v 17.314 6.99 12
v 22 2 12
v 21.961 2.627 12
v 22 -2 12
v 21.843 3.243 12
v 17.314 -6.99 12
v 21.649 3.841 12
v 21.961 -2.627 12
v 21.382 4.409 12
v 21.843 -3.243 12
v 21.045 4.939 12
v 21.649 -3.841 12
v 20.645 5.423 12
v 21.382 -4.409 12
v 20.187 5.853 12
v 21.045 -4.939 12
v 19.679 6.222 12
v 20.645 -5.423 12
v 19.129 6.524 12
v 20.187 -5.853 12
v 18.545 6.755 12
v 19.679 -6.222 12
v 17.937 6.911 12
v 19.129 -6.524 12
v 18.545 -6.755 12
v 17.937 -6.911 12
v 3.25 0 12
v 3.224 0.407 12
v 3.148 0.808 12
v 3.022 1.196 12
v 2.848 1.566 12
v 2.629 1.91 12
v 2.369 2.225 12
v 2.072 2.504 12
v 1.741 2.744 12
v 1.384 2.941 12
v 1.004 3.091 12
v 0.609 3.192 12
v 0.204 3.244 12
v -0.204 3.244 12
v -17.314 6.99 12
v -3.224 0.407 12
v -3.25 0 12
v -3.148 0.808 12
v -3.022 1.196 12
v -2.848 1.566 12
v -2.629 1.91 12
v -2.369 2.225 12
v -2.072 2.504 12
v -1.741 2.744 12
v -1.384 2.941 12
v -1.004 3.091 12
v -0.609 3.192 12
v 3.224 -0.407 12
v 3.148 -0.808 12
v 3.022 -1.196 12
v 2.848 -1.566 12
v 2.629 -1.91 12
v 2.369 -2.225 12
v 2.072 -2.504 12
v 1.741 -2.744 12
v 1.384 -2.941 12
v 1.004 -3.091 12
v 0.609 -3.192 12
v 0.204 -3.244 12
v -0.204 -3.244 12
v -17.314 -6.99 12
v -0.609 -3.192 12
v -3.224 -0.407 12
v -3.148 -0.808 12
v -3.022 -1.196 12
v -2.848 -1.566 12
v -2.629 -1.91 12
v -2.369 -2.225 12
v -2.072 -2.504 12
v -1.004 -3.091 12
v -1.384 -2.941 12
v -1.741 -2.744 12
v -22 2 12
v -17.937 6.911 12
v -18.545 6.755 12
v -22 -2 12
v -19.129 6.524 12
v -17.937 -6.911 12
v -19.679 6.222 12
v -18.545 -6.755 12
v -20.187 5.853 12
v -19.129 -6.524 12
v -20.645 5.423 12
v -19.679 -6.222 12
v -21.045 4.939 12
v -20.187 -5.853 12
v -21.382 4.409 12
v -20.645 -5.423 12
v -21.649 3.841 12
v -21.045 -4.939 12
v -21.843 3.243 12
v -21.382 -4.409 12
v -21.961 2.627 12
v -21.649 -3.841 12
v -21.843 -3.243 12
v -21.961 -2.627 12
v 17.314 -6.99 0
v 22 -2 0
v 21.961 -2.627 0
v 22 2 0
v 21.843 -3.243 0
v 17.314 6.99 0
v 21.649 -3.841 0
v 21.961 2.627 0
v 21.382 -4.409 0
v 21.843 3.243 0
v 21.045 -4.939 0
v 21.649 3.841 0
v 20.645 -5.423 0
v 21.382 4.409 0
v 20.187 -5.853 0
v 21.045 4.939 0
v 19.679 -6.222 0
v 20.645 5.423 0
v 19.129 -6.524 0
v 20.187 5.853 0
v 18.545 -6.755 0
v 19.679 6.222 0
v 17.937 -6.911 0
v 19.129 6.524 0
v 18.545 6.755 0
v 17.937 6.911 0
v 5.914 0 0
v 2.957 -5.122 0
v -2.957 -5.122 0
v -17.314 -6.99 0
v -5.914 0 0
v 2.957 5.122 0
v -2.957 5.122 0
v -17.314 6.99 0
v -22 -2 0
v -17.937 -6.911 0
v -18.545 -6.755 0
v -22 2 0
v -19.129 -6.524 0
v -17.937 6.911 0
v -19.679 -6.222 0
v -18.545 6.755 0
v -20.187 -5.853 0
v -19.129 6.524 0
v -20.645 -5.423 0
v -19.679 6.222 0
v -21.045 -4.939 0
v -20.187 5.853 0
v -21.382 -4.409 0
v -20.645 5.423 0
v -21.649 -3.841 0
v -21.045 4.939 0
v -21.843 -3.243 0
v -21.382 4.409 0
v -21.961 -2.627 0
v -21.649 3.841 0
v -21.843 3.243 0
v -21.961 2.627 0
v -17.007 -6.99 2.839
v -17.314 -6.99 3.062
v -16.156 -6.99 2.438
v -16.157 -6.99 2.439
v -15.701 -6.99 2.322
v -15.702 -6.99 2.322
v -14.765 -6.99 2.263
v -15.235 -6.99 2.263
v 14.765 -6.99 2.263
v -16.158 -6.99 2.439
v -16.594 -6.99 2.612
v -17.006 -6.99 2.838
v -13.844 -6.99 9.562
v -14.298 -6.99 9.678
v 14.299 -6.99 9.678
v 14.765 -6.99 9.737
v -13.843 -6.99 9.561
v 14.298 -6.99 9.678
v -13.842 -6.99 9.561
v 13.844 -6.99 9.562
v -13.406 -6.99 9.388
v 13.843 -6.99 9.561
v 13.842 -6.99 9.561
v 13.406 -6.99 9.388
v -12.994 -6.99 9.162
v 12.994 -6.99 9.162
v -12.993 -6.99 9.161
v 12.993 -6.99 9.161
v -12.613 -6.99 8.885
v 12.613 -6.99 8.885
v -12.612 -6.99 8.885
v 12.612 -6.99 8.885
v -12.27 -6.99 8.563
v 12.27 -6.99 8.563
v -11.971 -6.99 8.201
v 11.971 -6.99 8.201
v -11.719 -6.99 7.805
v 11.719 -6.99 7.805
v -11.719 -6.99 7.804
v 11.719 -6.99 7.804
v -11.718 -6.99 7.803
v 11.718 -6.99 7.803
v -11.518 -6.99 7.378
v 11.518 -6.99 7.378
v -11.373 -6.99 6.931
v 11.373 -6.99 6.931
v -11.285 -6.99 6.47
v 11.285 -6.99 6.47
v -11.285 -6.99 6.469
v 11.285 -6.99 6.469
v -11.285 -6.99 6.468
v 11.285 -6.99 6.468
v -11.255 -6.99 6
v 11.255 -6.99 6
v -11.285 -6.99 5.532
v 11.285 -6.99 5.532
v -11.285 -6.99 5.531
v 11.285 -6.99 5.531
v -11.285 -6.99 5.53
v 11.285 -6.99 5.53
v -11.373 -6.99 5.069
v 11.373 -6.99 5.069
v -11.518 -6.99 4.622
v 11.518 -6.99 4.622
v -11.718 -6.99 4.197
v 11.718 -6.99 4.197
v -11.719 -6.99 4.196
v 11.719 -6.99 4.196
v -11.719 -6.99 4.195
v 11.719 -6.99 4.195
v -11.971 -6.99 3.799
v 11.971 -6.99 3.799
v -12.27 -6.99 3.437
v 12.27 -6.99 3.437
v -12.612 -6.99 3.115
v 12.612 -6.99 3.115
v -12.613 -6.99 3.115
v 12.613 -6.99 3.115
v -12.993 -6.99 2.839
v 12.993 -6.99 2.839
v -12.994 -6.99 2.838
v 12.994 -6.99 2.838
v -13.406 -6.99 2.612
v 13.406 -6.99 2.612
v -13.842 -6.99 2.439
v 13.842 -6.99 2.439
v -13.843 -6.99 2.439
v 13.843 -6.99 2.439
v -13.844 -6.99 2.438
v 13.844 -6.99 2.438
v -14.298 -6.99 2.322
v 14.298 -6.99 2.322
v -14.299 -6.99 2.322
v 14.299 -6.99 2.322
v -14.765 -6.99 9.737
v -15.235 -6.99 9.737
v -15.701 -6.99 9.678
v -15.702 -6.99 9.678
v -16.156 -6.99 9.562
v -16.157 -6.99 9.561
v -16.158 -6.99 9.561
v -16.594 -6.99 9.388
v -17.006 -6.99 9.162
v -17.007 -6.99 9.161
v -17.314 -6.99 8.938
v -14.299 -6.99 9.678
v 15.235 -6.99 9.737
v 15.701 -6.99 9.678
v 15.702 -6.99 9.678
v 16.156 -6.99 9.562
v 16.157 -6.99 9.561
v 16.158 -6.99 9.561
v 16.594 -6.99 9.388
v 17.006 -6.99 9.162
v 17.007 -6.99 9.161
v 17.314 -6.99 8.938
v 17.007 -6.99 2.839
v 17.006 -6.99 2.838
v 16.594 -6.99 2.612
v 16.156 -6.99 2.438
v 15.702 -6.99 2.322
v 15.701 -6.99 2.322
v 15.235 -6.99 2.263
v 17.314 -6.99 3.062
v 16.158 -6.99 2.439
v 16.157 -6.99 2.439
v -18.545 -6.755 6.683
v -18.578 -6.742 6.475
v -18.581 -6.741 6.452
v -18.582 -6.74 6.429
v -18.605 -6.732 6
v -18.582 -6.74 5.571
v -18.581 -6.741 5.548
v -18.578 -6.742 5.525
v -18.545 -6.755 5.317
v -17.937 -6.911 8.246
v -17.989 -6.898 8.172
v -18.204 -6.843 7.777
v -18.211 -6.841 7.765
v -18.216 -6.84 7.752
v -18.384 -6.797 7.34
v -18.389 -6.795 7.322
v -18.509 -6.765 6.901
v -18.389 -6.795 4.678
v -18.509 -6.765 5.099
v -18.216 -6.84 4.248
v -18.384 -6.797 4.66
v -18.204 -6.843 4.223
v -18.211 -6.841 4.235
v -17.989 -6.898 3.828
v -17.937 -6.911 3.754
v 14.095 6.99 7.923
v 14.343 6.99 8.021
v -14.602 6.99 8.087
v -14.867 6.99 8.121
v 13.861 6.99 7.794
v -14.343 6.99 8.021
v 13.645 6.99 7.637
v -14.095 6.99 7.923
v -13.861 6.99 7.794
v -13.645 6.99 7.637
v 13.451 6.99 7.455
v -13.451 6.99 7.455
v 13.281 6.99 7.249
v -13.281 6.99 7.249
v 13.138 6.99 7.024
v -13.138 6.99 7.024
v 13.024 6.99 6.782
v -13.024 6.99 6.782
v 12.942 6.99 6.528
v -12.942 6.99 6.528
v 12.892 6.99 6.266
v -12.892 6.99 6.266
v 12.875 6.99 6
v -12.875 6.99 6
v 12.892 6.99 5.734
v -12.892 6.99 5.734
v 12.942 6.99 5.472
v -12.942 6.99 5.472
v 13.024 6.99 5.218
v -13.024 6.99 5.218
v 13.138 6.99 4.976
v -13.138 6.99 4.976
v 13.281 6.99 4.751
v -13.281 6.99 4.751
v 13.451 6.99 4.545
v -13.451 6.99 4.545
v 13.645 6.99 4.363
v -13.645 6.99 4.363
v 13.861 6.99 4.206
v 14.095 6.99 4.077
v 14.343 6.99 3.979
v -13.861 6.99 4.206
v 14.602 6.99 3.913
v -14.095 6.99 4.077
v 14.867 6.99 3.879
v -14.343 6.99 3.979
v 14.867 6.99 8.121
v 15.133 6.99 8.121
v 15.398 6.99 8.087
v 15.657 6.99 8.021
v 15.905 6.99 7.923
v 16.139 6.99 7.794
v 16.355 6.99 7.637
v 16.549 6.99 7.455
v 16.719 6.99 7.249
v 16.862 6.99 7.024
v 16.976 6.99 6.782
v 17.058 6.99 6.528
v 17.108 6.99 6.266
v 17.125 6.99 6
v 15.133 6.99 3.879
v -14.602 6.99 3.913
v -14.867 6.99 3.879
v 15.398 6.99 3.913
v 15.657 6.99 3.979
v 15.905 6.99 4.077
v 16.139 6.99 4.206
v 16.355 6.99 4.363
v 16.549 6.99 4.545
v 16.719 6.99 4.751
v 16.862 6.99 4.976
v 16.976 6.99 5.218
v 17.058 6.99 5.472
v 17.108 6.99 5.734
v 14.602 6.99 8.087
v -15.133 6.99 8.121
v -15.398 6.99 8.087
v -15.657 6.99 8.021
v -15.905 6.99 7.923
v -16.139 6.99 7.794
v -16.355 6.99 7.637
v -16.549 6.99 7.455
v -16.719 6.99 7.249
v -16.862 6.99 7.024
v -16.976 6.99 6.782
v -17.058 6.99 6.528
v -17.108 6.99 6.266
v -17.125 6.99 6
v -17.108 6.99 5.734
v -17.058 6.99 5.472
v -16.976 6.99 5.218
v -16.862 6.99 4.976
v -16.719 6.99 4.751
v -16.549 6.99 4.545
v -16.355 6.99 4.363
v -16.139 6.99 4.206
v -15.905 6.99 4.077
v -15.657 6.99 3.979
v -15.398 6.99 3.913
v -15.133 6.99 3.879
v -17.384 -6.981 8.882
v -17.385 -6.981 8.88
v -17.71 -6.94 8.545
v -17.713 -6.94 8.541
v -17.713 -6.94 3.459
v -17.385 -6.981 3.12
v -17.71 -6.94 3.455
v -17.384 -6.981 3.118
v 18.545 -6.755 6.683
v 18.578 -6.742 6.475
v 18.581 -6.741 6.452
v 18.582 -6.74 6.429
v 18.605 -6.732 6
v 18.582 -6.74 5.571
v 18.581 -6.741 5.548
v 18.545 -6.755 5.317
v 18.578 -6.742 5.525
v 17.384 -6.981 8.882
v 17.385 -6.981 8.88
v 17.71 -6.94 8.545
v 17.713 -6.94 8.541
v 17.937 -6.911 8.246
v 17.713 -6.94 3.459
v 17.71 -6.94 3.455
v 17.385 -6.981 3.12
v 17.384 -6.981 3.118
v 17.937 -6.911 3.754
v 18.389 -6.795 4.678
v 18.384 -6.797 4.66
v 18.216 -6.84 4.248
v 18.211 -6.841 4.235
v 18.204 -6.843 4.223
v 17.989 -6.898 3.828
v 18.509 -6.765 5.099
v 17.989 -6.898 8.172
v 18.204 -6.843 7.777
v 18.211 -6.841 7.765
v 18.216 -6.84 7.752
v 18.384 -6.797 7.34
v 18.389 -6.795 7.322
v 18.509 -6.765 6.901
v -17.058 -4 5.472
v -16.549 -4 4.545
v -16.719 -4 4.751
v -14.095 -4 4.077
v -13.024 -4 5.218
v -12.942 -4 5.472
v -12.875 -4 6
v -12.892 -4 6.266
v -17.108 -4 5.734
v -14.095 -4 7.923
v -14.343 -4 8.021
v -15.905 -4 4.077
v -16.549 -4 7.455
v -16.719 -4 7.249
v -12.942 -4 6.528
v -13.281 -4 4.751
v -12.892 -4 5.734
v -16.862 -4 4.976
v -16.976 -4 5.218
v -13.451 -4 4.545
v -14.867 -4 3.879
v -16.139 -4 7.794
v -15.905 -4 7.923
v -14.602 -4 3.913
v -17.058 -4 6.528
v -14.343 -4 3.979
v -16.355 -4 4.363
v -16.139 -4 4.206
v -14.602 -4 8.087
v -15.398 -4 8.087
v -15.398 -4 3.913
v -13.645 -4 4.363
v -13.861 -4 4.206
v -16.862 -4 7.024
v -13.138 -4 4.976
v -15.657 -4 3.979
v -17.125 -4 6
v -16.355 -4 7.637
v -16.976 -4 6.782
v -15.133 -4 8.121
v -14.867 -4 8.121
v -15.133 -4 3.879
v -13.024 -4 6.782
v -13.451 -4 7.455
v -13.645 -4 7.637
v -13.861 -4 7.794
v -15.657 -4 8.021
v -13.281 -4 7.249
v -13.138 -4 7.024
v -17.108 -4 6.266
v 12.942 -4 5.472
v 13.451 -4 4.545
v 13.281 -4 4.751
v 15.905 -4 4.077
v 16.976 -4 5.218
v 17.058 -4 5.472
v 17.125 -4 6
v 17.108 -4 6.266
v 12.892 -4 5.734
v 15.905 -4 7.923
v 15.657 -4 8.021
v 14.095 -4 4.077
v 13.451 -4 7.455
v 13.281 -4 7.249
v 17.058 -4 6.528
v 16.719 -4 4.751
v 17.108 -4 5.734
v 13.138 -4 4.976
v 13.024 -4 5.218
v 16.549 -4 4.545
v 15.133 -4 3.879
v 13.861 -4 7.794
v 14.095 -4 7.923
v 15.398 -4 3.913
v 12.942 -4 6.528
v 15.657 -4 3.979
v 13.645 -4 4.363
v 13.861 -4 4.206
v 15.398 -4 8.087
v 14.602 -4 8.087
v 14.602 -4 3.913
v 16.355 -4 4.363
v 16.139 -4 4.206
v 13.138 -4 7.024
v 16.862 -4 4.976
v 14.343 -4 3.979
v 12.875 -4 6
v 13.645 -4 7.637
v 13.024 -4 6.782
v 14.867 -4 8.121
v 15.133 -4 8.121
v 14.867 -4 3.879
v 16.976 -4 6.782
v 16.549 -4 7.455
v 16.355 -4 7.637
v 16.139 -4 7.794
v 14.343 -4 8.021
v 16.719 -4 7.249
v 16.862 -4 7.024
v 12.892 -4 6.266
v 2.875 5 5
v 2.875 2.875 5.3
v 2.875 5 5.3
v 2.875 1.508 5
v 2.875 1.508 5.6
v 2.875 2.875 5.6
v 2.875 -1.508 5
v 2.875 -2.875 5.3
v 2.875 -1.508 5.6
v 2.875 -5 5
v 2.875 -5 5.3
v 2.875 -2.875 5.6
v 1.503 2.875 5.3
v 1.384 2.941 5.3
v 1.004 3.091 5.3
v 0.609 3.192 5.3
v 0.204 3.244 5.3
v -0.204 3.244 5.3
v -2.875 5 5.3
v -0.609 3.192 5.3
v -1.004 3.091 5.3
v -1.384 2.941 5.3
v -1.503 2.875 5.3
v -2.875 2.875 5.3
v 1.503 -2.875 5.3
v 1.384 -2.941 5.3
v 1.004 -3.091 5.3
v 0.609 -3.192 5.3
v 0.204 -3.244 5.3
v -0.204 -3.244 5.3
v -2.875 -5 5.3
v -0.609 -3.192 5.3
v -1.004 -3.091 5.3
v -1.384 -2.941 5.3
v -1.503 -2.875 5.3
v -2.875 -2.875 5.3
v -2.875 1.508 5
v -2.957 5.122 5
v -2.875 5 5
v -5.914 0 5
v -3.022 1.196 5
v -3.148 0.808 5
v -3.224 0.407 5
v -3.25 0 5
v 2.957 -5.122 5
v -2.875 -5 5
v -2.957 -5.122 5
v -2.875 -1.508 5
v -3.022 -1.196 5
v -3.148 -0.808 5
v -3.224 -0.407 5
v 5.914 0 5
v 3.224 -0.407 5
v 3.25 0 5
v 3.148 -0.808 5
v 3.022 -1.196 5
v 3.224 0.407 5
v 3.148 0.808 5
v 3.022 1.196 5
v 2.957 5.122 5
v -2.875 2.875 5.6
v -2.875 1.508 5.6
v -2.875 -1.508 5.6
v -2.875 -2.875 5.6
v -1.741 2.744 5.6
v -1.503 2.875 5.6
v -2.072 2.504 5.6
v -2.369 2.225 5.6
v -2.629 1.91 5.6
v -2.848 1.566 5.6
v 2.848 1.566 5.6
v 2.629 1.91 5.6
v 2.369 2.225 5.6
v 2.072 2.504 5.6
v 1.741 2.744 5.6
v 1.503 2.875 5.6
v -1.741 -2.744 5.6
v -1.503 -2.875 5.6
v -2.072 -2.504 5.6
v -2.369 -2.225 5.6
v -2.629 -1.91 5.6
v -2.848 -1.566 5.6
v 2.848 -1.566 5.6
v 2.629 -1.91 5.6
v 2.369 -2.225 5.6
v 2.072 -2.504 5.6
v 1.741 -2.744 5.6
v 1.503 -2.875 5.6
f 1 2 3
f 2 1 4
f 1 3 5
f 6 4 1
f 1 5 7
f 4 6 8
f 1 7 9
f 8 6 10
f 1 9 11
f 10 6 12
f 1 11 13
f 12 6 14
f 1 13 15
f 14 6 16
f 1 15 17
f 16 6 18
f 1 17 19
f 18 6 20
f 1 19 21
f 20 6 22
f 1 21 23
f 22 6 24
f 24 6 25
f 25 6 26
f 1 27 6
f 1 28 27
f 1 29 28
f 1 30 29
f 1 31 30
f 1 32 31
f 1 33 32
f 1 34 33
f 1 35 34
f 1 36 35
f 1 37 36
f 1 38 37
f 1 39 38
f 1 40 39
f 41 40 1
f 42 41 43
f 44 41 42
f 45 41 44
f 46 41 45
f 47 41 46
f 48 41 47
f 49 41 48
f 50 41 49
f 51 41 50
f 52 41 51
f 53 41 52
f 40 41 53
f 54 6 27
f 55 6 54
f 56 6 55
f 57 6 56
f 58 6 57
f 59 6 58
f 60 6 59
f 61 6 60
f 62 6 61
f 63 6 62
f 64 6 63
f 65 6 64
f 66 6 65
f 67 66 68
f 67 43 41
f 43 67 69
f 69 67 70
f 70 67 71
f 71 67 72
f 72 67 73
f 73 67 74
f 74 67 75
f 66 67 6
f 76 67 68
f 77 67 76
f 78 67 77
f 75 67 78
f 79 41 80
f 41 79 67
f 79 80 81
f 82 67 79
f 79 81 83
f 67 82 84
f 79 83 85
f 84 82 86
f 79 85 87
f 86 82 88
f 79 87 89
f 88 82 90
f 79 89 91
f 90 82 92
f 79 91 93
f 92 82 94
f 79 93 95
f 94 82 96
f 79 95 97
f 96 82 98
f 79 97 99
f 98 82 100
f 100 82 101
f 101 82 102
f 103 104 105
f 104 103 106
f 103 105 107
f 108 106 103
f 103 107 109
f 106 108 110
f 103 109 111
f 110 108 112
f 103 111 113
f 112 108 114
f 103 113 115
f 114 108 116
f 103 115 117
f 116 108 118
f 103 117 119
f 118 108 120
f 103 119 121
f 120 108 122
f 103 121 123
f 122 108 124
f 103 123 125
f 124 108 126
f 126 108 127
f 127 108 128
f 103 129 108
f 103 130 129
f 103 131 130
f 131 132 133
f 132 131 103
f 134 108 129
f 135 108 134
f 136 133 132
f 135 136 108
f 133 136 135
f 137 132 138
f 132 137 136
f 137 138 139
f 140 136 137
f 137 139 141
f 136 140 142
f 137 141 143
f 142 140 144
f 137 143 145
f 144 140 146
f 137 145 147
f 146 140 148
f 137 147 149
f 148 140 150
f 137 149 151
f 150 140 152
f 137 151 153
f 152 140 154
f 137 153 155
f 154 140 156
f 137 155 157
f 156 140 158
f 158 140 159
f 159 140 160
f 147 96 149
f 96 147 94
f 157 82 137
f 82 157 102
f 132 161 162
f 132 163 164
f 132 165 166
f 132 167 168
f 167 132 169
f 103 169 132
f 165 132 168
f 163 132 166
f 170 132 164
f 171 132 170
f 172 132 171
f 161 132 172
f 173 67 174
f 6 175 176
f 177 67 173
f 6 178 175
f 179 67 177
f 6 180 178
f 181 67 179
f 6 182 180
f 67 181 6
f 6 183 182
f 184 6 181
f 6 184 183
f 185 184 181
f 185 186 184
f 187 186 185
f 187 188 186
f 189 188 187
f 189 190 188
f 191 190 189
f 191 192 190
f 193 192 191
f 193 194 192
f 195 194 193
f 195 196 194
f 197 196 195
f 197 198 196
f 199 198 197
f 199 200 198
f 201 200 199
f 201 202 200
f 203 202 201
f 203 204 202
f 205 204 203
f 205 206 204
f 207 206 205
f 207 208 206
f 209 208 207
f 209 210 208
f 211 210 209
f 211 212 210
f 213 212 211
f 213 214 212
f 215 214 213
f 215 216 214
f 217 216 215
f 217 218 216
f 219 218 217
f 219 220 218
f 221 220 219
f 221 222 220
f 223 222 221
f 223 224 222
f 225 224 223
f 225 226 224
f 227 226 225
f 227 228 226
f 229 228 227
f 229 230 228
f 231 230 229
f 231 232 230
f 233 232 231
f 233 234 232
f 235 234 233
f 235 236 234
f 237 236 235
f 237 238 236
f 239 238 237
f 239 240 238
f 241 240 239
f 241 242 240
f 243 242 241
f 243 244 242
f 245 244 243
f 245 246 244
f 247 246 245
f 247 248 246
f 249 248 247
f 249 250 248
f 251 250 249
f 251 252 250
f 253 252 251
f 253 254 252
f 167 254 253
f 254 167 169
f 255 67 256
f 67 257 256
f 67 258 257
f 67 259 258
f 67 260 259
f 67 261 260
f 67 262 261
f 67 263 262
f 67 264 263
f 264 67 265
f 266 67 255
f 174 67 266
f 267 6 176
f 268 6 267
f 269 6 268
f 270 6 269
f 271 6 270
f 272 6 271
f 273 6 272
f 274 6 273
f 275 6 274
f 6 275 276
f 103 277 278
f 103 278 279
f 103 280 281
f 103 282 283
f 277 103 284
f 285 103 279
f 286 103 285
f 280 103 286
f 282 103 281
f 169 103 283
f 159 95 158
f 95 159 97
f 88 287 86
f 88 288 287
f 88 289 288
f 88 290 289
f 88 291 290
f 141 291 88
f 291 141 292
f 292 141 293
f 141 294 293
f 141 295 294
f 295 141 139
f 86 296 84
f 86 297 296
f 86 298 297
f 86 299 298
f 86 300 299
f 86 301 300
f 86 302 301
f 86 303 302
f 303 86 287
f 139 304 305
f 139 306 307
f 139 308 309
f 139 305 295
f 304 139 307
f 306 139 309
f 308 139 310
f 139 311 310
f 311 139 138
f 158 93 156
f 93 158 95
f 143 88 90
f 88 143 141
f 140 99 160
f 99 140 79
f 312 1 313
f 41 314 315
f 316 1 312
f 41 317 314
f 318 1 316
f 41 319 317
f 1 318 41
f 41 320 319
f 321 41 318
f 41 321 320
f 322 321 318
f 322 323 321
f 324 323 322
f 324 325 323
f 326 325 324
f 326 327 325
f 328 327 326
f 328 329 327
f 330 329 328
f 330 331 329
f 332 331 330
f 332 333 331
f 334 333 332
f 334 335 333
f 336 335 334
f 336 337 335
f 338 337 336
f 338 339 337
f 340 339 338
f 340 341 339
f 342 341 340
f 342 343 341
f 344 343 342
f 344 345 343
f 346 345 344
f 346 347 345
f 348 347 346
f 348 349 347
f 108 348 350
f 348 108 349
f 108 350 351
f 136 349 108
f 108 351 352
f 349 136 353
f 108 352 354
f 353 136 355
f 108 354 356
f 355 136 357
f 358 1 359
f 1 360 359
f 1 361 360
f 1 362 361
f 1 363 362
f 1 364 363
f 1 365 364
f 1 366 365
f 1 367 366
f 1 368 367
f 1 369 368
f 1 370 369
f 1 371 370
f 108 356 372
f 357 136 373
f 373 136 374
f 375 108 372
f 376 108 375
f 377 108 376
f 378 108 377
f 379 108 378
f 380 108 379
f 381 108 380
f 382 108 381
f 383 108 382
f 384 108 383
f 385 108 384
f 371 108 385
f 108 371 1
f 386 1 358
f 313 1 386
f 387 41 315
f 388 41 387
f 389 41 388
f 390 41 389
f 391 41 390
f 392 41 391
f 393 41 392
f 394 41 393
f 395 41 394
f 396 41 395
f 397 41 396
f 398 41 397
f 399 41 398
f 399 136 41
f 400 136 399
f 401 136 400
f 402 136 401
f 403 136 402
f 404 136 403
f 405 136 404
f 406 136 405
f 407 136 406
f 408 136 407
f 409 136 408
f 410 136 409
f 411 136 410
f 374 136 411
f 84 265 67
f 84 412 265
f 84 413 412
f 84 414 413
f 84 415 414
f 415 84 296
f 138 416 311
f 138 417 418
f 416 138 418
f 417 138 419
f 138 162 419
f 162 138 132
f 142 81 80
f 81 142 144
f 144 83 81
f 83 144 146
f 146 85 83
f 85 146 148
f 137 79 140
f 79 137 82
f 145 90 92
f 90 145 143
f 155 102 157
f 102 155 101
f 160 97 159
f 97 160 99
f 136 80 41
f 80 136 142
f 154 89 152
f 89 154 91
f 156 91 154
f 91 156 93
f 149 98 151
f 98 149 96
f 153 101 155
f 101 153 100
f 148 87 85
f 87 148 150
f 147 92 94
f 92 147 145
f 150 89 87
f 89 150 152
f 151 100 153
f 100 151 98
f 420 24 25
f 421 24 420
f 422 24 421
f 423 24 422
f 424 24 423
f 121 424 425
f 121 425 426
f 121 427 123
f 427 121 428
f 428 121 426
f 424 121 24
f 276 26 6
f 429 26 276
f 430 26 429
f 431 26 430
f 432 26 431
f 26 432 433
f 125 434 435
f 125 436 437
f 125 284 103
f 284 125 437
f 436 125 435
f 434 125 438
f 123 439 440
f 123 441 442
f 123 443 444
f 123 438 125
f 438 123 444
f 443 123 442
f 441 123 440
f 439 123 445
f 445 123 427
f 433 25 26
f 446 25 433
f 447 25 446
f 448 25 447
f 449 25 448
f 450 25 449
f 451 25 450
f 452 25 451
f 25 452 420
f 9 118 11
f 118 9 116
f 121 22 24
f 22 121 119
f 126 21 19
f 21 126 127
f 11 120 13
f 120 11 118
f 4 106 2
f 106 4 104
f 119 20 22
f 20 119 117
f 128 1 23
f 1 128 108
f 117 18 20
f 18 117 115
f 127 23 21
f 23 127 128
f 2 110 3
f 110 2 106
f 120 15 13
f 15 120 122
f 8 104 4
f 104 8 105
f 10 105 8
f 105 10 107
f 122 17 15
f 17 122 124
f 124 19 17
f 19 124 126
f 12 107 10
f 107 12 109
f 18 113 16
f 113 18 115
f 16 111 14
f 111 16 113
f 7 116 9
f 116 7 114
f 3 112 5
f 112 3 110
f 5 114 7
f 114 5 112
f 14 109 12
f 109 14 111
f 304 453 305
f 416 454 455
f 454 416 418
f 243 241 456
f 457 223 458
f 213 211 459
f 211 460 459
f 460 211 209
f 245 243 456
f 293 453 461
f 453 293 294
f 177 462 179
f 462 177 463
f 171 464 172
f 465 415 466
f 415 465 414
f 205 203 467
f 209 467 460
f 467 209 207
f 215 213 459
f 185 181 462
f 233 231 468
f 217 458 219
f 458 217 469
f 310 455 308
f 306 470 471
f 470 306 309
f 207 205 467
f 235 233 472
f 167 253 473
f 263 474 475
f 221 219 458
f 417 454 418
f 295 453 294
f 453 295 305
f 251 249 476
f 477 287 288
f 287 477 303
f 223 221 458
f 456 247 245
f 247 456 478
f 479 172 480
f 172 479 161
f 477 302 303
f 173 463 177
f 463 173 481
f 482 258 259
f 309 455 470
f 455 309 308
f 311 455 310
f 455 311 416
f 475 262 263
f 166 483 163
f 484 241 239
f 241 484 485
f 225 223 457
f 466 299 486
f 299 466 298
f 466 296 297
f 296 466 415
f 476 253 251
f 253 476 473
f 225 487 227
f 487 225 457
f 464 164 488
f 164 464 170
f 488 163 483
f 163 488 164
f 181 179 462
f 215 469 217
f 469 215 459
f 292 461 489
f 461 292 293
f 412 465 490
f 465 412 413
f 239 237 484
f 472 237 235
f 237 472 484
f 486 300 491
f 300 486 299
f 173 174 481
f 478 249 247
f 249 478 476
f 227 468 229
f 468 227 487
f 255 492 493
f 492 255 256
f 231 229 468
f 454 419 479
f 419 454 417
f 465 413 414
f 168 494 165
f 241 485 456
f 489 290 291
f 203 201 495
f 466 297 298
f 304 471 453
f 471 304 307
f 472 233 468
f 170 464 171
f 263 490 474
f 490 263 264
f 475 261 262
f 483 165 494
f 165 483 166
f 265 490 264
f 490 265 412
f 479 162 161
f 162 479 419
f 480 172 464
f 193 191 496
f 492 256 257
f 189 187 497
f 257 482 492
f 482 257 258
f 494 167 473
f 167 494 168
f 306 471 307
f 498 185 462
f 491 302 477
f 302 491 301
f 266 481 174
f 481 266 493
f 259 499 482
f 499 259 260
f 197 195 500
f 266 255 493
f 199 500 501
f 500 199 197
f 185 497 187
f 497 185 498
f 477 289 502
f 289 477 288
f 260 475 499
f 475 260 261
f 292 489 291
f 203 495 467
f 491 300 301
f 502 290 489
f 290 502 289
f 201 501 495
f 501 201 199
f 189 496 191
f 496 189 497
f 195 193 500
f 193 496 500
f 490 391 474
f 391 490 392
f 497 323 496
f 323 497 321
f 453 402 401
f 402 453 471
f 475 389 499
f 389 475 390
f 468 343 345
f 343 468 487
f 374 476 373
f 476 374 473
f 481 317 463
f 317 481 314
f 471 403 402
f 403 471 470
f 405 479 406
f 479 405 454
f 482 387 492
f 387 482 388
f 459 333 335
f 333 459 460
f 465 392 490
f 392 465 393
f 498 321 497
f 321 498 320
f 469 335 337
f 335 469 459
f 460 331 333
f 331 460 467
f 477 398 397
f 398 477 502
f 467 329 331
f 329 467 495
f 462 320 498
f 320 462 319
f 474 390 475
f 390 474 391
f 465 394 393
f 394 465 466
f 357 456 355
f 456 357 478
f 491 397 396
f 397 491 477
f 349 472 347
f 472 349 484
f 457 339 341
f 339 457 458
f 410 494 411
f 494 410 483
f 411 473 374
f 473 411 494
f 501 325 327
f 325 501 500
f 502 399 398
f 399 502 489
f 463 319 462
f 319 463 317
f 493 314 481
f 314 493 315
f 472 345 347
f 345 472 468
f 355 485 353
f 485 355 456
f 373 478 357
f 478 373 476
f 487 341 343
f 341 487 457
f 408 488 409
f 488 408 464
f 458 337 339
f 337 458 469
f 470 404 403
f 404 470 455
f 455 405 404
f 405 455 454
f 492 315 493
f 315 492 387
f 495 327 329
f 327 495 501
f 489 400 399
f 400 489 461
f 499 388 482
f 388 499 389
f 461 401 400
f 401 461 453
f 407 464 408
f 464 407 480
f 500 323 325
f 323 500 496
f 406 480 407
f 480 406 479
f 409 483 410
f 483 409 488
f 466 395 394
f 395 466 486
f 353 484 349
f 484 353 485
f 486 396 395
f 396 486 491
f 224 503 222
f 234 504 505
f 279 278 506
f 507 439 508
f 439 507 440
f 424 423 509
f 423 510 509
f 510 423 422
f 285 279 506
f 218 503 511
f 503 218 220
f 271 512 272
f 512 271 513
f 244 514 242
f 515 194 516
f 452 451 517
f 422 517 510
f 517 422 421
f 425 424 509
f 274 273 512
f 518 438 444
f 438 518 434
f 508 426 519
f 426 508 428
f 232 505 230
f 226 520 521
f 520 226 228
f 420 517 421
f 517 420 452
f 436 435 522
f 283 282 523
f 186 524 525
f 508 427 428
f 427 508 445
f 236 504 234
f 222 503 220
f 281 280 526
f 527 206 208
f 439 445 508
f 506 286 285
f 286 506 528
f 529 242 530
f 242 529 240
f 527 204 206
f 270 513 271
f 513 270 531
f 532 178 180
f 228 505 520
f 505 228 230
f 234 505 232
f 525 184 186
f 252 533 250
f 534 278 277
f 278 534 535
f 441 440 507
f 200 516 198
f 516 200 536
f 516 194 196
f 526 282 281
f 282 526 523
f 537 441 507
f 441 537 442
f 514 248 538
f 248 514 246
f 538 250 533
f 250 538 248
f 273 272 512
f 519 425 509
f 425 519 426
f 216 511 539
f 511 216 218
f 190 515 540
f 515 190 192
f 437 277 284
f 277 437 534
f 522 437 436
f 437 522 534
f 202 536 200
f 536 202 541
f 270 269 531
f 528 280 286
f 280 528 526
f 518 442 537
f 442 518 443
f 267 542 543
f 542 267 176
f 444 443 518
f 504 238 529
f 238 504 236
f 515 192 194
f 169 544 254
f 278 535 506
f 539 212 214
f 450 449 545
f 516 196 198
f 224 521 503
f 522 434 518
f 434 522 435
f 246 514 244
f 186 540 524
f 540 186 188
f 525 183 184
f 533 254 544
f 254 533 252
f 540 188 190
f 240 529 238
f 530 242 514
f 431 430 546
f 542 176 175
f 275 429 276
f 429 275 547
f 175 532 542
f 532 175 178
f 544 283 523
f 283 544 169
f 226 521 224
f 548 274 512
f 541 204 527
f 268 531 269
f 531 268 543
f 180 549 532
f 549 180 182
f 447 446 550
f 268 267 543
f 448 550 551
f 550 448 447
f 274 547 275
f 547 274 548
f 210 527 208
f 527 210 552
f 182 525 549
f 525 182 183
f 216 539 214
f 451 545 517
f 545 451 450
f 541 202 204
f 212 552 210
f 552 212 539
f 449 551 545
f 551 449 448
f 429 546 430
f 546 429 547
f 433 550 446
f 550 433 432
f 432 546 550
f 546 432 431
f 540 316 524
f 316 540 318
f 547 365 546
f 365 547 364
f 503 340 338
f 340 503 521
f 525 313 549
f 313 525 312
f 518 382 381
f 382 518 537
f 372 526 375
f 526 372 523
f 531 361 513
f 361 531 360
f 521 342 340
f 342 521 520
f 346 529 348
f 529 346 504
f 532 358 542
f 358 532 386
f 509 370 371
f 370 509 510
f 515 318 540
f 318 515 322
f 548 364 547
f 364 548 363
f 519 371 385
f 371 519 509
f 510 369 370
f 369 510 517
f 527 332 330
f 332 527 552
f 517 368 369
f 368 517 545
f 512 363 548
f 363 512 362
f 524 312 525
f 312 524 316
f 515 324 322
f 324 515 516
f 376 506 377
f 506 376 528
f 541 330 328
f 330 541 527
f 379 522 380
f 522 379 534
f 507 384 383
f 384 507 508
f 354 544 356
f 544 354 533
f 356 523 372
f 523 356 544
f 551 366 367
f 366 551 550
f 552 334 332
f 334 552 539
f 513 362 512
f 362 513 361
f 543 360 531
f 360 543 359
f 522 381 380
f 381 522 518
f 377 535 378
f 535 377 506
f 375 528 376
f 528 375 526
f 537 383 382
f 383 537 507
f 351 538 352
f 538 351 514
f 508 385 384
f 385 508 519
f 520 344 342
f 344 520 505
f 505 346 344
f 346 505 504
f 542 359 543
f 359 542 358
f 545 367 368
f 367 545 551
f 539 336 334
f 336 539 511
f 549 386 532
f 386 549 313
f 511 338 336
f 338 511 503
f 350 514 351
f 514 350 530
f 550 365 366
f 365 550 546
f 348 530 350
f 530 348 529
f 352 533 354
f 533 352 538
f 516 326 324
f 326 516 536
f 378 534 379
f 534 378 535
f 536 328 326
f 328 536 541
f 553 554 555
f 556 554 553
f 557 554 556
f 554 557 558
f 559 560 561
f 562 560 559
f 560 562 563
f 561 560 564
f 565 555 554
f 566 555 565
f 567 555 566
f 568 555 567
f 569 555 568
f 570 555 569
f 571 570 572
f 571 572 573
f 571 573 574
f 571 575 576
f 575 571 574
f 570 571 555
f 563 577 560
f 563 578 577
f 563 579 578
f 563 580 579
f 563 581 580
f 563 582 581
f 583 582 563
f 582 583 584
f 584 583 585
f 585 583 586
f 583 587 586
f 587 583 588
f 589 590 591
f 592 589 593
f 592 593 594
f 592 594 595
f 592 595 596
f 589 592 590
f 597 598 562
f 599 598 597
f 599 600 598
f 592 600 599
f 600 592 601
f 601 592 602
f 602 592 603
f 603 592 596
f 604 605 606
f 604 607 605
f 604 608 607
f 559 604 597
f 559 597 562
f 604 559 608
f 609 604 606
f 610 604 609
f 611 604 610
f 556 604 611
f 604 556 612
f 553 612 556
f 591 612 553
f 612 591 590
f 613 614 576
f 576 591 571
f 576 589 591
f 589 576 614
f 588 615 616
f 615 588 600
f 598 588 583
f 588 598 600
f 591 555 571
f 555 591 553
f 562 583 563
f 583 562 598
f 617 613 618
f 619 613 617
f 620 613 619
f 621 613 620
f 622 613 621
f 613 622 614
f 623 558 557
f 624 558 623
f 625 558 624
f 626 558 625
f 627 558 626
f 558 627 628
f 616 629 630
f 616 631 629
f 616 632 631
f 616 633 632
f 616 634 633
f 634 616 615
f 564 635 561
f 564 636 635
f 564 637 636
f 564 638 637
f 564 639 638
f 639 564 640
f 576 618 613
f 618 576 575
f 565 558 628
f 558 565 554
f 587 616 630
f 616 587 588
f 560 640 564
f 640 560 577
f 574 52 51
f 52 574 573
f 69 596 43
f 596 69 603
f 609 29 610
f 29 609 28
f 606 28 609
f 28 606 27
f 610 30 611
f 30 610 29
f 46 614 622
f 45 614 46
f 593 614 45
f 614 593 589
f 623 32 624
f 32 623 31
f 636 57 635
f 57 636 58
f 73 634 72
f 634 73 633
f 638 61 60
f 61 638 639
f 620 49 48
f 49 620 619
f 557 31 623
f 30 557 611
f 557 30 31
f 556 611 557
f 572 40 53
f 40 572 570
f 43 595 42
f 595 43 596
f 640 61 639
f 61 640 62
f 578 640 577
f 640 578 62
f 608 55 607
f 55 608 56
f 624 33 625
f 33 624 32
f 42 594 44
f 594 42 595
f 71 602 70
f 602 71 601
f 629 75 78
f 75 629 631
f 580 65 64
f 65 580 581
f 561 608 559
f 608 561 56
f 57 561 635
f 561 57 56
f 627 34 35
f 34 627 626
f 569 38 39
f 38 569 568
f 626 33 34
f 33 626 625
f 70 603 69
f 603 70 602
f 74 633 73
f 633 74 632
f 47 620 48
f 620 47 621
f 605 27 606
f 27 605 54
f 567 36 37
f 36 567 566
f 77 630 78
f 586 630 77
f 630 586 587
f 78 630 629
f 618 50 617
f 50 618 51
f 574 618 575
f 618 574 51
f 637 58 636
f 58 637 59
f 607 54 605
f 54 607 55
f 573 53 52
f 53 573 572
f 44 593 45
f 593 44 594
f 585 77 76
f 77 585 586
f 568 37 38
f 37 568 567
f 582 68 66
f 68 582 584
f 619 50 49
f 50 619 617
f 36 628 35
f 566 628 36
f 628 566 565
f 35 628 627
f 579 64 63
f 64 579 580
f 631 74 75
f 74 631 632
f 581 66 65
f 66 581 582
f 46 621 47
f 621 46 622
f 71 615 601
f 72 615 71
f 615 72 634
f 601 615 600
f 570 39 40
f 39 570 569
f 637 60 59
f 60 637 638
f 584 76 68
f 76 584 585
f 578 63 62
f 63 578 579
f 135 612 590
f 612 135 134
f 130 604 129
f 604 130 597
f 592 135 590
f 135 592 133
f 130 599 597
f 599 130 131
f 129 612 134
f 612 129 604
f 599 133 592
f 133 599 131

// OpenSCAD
$fn = 50;


difference() {
	union() {
		cylinder(h = 12, r = 7.0000000000);
		translate(v = [-7.5000000000, 0.0000000000, 0]) {
			hull() {
				translate(v = [-9.5000000000, 2.0000000000, 0]) {
					cylinder(h = 12, r = 5);
				}
				translate(v = [9.5000000000, 2.0000000000, 0]) {
					cylinder(h = 12, r = 5);
				}
				translate(v = [-9.5000000000, -2.0000000000, 0]) {
					cylinder(h = 12, r = 5);
				}
				translate(v = [9.5000000000, -2.0000000000, 0]) {
					cylinder(h = 12, r = 5);
				}
			}
		}
		translate(v = [7.5000000000, 0.0000000000, 0]) {
			hull() {
				translate(v = [-9.5000000000, 2.0000000000, 0]) {
					cylinder(h = 12, r = 5);
				}
				translate(v = [9.5000000000, 2.0000000000, 0]) {
					cylinder(h = 12, r = 5);
				}
				translate(v = [-9.5000000000, -2.0000000000, 0]) {
					cylinder(h = 12, r = 5);
				}
				translate(v = [9.5000000000, -2.0000000000, 0]) {
					cylinder(h = 12, r = 5);
				}
			}
		}
	}
	union() {
		translate(v = [-15.0000000000, -7.0000000000, 6.0000000000]) {
			rotate(a = [90, 0, 0]) {
				difference() {
					union() {
						#translate(v = [0, 0, -14.0000000000]) {
							cylinder(h = 14, r = 2.0000000000);
						}
						#translate(v = [0, 0, -3]) {
							cylinder(h = 3, r1 = 2.1250000000, r2 = 3.7500000000);
						}
						#translate(v = [0, 0, -14.0000000000]) {
							cylinder(h = 14, r = 2.1250000000);
						}
						#translate(v = [0, 0, -14.0000000000]) {
							cylinder(h = 14, r = 2.0000000000);
						}
					}
					union();
				}
			}
		}
		translate(v = [15.0000000000, -7.0000000000, 6.0000000000]) {
			rotate(a = [90, 0, 0]) {
				difference() {
					union() {
						#translate(v = [0, 0, -14.0000000000]) {
							cylinder(h = 14, r = 2.0000000000);
						}
						#translate(v = [0, 0, -3]) {
							cylinder(h = 3, r1 = 2.1250000000, r2 = 3.7500000000);
						}
						#translate(v = [0, 0, -14.0000000000]) {
							cylinder(h = 14, r = 2.1250000000);
						}
						#translate(v = [0, 0, -14.0000000000]) {
							cylinder(h = 14, r = 2.0000000000);
						}
					}
					union();
				}
			}
		}
		translate(v = [0.0000000000, 0.0000000000, 0]) {
			rotate(a = [0, 0, 0]) {
				difference() {
					union() {
						#translate(v = [-2.8750000000, -5.0000000000, -0.3000000000]) {
							cube(size = [5.7500000000, 10, 0.3000000000]);
						}
						#translate(v = [-2.8750000000, -2.8750000000, -0.6000000000]) {
							cube(size = [5.7500000000, 5.7500000000, 0.3000000000]);
						}
						#translate(v = [-2.8750000000, -5.0000000000, 5]) {
							cube(size = [5.7500000000, 10, 0.3000000000]);
						}
						#translate(v = [-2.8750000000, -2.8750000000, 5.3000000000]) {
							cube(size = [5.7500000000, 5.7500000000, 0.3000000000]);
						}
						#translate(v = [0, 0, -100.0000000000]) {
							cylinder(h = 200, r = 3.2500000000);
						}
						#linear_extrude(height = 5) {
							polygon(points = [[5.9142500000, 0.0000000000], [2.9571250000, 5.1218907443], [-2.9571250000, 5.1218907443], [-5.9142500000, 0.0000000000], [-2.9571250000, -5.1218907443], [2.9571250000, -5.1218907443]]);
						}
						#translate(v = [-2.8750000000, -5.0000000000, -0.3000000000]) {
							cube(size = [5.7500000000, 10, 0.3000000000]);
						}
						#translate(v = [-2.8750000000, -2.8750000000, -0.6000000000]) {
							cube(size = [5.7500000000, 5.7500000000, 0.3000000000]);
						}
						#translate(v = [-2.8750000000, -5.0000000000, 5]) {
							cube(size = [5.7500000000, 10, 0.3000000000]);
						}
						#translate(v = [-2.8750000000, -2.8750000000, 5.3000000000]) {
							cube(size = [5.7500000000, 5.7500000000, 0.3000000000]);
						}
						#translate(v = [0, 0, -100.0000000000]) {
							cylinder(h = 200, r = 3.2500000000);
						}
						#translate(v = [-2.8750000000, -5.0000000000, -0.3000000000]) {
							cube(size = [5.7500000000, 10, 0.3000000000]);
						}
						#translate(v = [-2.8750000000, -2.8750000000, -0.6000000000]) {
							cube(size = [5.7500000000, 5.7500000000, 0.3000000000]);
						}
						#translate(v = [-2.8750000000, -5.0000000000, 5]) {
							cube(size = [5.7500000000, 10, 0.3000000000]);
						}
						#translate(v = [-2.8750000000, -2.8750000000, 5.3000000000]) {
							cube(size = [5.7500000000, 5.7500000000, 0.3000000000]);
						}
						#translate(v = [0, 0, -100.0000000000]) {
							cylinder(h = 200, r = 3.2500000000);
						}
					}
					union();
				}
			}
		}
		translate(v = [0, 0, -100]) {
			cylinder(h = 200, r = 3.2500000000);
		}
		translate(v = [0, 0, -100]) {
			cylinder(h = 200, r = 1.8000000000);
		}
	}
}
